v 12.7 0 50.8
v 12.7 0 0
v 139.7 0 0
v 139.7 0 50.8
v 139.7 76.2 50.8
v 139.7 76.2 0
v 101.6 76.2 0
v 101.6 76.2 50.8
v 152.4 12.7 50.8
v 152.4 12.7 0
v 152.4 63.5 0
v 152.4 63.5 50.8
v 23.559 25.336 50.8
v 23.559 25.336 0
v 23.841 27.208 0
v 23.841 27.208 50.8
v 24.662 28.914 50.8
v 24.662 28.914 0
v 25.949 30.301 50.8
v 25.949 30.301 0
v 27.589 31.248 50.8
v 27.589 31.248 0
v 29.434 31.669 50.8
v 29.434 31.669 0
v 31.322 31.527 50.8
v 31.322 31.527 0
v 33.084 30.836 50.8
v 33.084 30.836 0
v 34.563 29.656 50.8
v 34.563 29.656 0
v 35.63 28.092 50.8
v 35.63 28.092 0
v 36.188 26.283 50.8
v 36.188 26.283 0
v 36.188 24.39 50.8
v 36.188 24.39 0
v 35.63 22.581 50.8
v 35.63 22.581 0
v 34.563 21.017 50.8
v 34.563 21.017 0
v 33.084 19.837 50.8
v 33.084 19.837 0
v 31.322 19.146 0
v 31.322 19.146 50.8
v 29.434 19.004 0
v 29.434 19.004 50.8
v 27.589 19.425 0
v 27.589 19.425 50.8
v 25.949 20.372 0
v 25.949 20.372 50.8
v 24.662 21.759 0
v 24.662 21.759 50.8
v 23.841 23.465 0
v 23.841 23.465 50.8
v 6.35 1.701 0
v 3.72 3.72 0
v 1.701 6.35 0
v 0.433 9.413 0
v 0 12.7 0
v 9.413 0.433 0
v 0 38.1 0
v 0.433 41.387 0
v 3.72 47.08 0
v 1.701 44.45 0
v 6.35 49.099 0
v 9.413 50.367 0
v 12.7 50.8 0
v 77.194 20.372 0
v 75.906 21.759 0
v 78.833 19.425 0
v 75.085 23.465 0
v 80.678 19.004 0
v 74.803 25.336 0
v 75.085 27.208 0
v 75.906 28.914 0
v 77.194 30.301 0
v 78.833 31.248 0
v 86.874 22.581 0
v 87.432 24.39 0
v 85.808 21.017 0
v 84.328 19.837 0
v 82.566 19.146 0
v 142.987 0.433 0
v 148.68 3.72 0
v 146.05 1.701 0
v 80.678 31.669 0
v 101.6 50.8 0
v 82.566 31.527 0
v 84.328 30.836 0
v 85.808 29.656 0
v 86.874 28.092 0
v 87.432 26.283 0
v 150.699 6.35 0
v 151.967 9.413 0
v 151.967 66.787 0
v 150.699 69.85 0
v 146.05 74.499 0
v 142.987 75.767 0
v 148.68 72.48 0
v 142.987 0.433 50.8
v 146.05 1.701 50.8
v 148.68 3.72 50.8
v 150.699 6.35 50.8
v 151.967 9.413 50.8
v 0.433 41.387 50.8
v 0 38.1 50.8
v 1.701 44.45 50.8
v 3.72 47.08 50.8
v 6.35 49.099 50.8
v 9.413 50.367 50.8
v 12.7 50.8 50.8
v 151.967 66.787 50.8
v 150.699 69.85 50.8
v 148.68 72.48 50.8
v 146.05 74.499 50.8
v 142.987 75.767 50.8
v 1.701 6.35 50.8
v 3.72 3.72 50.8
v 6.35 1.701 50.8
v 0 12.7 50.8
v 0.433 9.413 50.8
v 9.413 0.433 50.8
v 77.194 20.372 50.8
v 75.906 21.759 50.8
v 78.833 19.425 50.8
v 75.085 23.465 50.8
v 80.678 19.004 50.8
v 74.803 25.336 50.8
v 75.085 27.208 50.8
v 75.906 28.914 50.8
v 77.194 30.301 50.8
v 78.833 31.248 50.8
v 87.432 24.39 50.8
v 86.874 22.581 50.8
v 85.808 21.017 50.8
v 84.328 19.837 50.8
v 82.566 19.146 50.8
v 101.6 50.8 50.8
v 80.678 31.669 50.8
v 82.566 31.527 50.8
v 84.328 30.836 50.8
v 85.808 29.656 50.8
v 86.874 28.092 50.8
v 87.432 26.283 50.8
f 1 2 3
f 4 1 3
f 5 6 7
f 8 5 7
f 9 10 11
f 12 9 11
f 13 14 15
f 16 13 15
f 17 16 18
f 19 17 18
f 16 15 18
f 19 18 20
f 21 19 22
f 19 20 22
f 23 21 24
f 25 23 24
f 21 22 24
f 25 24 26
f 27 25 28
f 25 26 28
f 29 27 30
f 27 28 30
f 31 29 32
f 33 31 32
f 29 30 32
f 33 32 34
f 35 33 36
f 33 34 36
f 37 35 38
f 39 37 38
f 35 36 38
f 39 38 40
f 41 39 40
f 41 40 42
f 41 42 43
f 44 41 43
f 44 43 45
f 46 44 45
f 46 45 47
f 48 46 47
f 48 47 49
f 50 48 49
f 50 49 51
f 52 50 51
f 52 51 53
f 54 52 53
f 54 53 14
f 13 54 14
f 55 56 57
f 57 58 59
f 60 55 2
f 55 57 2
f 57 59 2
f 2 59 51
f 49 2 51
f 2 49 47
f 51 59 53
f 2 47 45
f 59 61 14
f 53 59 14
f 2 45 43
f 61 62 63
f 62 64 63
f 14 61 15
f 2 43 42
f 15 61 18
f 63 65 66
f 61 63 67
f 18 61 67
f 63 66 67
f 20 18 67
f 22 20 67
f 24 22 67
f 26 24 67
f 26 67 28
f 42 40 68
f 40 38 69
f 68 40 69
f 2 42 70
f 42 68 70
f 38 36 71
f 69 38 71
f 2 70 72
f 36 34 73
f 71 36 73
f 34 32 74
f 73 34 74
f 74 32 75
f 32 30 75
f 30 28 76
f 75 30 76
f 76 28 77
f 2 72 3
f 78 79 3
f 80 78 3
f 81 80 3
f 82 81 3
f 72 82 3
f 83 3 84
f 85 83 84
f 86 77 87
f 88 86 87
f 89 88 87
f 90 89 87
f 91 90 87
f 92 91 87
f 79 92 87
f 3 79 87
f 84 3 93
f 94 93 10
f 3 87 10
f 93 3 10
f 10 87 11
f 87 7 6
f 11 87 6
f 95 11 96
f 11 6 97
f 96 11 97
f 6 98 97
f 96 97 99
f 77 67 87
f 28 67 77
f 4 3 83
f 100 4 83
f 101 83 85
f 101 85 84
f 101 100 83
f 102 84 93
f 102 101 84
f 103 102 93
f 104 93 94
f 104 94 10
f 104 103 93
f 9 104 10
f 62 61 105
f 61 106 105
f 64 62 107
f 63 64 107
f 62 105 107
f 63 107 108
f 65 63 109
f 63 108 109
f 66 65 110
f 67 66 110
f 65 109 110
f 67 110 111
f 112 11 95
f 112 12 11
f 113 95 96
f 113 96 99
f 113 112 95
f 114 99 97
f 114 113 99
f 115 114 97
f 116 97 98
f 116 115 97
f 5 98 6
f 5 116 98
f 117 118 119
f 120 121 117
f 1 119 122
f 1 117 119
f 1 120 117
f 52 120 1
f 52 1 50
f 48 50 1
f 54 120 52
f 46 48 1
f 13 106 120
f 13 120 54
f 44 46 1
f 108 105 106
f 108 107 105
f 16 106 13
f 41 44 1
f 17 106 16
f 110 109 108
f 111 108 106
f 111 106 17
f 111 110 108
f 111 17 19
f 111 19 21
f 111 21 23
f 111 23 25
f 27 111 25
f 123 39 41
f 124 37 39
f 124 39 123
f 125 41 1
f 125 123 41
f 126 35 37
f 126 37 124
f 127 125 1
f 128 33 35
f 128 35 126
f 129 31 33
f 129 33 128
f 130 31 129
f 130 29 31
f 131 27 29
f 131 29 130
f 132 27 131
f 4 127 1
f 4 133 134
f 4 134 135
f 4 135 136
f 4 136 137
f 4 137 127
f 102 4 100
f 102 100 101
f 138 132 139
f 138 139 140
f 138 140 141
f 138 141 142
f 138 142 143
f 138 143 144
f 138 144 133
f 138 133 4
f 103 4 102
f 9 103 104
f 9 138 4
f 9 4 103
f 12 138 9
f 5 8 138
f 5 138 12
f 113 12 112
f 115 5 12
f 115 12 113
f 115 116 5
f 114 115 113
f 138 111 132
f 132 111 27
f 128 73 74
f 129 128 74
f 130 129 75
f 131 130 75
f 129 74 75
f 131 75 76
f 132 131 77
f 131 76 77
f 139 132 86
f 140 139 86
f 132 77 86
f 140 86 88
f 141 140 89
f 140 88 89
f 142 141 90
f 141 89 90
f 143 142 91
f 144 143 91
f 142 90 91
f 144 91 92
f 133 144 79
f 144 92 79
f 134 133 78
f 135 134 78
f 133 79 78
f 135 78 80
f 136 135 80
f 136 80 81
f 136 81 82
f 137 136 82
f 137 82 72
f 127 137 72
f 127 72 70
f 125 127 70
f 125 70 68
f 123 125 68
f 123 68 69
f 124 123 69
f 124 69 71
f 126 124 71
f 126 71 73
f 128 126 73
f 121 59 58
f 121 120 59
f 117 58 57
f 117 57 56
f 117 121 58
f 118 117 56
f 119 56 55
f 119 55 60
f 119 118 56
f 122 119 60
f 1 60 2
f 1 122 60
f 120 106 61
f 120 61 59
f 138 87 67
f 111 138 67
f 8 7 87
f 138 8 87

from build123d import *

# Parameters (mm, degrees)
F1_DEPTH = 50.8
F2_R     = 12.7
F3_R     = 12.7
F4_R     = 12.7
F7_D     = 12.7


with BuildPart() as f1:
    # F0 (on Top) → F1 (new body)
    with BuildSketch(Plane.XY):
        Polygon((0, 50.8), (0, 0), (152.4, 0), (152.4, 76.2), (101.6, 76.2), (101.6, 50.8), align=None)
    extrude(amount=F1_DEPTH)

    # F2
    f2_edges = [f1.edges().sort_by_distance(p)[0] for p in [
        (152.4, 76.2, 25.4),
    ]]
    fillet(f2_edges, radius=F2_R)

    # F3
    f3_edges = [f1.edges().sort_by_distance(p)[0] for p in [
        (0, 50.8, 25.4),
    ]]
    fillet(f3_edges, radius=F3_R)

    # F4
    f4_edges = [f1.edges().sort_by_distance(p)[0] for p in [
        (0, 0, 25.4),
        (152.4, 0, 25.4),
    ]]
    fillet(f4_edges, radius=F4_R)

    # F7 (through all)
    with Locations(Plane.XY.offset(50.8)):
        with Locations((29.908501, 25.3365), (81.15299, 25.3365)):
            Hole(F7_D / 2)


solid = f1.part
